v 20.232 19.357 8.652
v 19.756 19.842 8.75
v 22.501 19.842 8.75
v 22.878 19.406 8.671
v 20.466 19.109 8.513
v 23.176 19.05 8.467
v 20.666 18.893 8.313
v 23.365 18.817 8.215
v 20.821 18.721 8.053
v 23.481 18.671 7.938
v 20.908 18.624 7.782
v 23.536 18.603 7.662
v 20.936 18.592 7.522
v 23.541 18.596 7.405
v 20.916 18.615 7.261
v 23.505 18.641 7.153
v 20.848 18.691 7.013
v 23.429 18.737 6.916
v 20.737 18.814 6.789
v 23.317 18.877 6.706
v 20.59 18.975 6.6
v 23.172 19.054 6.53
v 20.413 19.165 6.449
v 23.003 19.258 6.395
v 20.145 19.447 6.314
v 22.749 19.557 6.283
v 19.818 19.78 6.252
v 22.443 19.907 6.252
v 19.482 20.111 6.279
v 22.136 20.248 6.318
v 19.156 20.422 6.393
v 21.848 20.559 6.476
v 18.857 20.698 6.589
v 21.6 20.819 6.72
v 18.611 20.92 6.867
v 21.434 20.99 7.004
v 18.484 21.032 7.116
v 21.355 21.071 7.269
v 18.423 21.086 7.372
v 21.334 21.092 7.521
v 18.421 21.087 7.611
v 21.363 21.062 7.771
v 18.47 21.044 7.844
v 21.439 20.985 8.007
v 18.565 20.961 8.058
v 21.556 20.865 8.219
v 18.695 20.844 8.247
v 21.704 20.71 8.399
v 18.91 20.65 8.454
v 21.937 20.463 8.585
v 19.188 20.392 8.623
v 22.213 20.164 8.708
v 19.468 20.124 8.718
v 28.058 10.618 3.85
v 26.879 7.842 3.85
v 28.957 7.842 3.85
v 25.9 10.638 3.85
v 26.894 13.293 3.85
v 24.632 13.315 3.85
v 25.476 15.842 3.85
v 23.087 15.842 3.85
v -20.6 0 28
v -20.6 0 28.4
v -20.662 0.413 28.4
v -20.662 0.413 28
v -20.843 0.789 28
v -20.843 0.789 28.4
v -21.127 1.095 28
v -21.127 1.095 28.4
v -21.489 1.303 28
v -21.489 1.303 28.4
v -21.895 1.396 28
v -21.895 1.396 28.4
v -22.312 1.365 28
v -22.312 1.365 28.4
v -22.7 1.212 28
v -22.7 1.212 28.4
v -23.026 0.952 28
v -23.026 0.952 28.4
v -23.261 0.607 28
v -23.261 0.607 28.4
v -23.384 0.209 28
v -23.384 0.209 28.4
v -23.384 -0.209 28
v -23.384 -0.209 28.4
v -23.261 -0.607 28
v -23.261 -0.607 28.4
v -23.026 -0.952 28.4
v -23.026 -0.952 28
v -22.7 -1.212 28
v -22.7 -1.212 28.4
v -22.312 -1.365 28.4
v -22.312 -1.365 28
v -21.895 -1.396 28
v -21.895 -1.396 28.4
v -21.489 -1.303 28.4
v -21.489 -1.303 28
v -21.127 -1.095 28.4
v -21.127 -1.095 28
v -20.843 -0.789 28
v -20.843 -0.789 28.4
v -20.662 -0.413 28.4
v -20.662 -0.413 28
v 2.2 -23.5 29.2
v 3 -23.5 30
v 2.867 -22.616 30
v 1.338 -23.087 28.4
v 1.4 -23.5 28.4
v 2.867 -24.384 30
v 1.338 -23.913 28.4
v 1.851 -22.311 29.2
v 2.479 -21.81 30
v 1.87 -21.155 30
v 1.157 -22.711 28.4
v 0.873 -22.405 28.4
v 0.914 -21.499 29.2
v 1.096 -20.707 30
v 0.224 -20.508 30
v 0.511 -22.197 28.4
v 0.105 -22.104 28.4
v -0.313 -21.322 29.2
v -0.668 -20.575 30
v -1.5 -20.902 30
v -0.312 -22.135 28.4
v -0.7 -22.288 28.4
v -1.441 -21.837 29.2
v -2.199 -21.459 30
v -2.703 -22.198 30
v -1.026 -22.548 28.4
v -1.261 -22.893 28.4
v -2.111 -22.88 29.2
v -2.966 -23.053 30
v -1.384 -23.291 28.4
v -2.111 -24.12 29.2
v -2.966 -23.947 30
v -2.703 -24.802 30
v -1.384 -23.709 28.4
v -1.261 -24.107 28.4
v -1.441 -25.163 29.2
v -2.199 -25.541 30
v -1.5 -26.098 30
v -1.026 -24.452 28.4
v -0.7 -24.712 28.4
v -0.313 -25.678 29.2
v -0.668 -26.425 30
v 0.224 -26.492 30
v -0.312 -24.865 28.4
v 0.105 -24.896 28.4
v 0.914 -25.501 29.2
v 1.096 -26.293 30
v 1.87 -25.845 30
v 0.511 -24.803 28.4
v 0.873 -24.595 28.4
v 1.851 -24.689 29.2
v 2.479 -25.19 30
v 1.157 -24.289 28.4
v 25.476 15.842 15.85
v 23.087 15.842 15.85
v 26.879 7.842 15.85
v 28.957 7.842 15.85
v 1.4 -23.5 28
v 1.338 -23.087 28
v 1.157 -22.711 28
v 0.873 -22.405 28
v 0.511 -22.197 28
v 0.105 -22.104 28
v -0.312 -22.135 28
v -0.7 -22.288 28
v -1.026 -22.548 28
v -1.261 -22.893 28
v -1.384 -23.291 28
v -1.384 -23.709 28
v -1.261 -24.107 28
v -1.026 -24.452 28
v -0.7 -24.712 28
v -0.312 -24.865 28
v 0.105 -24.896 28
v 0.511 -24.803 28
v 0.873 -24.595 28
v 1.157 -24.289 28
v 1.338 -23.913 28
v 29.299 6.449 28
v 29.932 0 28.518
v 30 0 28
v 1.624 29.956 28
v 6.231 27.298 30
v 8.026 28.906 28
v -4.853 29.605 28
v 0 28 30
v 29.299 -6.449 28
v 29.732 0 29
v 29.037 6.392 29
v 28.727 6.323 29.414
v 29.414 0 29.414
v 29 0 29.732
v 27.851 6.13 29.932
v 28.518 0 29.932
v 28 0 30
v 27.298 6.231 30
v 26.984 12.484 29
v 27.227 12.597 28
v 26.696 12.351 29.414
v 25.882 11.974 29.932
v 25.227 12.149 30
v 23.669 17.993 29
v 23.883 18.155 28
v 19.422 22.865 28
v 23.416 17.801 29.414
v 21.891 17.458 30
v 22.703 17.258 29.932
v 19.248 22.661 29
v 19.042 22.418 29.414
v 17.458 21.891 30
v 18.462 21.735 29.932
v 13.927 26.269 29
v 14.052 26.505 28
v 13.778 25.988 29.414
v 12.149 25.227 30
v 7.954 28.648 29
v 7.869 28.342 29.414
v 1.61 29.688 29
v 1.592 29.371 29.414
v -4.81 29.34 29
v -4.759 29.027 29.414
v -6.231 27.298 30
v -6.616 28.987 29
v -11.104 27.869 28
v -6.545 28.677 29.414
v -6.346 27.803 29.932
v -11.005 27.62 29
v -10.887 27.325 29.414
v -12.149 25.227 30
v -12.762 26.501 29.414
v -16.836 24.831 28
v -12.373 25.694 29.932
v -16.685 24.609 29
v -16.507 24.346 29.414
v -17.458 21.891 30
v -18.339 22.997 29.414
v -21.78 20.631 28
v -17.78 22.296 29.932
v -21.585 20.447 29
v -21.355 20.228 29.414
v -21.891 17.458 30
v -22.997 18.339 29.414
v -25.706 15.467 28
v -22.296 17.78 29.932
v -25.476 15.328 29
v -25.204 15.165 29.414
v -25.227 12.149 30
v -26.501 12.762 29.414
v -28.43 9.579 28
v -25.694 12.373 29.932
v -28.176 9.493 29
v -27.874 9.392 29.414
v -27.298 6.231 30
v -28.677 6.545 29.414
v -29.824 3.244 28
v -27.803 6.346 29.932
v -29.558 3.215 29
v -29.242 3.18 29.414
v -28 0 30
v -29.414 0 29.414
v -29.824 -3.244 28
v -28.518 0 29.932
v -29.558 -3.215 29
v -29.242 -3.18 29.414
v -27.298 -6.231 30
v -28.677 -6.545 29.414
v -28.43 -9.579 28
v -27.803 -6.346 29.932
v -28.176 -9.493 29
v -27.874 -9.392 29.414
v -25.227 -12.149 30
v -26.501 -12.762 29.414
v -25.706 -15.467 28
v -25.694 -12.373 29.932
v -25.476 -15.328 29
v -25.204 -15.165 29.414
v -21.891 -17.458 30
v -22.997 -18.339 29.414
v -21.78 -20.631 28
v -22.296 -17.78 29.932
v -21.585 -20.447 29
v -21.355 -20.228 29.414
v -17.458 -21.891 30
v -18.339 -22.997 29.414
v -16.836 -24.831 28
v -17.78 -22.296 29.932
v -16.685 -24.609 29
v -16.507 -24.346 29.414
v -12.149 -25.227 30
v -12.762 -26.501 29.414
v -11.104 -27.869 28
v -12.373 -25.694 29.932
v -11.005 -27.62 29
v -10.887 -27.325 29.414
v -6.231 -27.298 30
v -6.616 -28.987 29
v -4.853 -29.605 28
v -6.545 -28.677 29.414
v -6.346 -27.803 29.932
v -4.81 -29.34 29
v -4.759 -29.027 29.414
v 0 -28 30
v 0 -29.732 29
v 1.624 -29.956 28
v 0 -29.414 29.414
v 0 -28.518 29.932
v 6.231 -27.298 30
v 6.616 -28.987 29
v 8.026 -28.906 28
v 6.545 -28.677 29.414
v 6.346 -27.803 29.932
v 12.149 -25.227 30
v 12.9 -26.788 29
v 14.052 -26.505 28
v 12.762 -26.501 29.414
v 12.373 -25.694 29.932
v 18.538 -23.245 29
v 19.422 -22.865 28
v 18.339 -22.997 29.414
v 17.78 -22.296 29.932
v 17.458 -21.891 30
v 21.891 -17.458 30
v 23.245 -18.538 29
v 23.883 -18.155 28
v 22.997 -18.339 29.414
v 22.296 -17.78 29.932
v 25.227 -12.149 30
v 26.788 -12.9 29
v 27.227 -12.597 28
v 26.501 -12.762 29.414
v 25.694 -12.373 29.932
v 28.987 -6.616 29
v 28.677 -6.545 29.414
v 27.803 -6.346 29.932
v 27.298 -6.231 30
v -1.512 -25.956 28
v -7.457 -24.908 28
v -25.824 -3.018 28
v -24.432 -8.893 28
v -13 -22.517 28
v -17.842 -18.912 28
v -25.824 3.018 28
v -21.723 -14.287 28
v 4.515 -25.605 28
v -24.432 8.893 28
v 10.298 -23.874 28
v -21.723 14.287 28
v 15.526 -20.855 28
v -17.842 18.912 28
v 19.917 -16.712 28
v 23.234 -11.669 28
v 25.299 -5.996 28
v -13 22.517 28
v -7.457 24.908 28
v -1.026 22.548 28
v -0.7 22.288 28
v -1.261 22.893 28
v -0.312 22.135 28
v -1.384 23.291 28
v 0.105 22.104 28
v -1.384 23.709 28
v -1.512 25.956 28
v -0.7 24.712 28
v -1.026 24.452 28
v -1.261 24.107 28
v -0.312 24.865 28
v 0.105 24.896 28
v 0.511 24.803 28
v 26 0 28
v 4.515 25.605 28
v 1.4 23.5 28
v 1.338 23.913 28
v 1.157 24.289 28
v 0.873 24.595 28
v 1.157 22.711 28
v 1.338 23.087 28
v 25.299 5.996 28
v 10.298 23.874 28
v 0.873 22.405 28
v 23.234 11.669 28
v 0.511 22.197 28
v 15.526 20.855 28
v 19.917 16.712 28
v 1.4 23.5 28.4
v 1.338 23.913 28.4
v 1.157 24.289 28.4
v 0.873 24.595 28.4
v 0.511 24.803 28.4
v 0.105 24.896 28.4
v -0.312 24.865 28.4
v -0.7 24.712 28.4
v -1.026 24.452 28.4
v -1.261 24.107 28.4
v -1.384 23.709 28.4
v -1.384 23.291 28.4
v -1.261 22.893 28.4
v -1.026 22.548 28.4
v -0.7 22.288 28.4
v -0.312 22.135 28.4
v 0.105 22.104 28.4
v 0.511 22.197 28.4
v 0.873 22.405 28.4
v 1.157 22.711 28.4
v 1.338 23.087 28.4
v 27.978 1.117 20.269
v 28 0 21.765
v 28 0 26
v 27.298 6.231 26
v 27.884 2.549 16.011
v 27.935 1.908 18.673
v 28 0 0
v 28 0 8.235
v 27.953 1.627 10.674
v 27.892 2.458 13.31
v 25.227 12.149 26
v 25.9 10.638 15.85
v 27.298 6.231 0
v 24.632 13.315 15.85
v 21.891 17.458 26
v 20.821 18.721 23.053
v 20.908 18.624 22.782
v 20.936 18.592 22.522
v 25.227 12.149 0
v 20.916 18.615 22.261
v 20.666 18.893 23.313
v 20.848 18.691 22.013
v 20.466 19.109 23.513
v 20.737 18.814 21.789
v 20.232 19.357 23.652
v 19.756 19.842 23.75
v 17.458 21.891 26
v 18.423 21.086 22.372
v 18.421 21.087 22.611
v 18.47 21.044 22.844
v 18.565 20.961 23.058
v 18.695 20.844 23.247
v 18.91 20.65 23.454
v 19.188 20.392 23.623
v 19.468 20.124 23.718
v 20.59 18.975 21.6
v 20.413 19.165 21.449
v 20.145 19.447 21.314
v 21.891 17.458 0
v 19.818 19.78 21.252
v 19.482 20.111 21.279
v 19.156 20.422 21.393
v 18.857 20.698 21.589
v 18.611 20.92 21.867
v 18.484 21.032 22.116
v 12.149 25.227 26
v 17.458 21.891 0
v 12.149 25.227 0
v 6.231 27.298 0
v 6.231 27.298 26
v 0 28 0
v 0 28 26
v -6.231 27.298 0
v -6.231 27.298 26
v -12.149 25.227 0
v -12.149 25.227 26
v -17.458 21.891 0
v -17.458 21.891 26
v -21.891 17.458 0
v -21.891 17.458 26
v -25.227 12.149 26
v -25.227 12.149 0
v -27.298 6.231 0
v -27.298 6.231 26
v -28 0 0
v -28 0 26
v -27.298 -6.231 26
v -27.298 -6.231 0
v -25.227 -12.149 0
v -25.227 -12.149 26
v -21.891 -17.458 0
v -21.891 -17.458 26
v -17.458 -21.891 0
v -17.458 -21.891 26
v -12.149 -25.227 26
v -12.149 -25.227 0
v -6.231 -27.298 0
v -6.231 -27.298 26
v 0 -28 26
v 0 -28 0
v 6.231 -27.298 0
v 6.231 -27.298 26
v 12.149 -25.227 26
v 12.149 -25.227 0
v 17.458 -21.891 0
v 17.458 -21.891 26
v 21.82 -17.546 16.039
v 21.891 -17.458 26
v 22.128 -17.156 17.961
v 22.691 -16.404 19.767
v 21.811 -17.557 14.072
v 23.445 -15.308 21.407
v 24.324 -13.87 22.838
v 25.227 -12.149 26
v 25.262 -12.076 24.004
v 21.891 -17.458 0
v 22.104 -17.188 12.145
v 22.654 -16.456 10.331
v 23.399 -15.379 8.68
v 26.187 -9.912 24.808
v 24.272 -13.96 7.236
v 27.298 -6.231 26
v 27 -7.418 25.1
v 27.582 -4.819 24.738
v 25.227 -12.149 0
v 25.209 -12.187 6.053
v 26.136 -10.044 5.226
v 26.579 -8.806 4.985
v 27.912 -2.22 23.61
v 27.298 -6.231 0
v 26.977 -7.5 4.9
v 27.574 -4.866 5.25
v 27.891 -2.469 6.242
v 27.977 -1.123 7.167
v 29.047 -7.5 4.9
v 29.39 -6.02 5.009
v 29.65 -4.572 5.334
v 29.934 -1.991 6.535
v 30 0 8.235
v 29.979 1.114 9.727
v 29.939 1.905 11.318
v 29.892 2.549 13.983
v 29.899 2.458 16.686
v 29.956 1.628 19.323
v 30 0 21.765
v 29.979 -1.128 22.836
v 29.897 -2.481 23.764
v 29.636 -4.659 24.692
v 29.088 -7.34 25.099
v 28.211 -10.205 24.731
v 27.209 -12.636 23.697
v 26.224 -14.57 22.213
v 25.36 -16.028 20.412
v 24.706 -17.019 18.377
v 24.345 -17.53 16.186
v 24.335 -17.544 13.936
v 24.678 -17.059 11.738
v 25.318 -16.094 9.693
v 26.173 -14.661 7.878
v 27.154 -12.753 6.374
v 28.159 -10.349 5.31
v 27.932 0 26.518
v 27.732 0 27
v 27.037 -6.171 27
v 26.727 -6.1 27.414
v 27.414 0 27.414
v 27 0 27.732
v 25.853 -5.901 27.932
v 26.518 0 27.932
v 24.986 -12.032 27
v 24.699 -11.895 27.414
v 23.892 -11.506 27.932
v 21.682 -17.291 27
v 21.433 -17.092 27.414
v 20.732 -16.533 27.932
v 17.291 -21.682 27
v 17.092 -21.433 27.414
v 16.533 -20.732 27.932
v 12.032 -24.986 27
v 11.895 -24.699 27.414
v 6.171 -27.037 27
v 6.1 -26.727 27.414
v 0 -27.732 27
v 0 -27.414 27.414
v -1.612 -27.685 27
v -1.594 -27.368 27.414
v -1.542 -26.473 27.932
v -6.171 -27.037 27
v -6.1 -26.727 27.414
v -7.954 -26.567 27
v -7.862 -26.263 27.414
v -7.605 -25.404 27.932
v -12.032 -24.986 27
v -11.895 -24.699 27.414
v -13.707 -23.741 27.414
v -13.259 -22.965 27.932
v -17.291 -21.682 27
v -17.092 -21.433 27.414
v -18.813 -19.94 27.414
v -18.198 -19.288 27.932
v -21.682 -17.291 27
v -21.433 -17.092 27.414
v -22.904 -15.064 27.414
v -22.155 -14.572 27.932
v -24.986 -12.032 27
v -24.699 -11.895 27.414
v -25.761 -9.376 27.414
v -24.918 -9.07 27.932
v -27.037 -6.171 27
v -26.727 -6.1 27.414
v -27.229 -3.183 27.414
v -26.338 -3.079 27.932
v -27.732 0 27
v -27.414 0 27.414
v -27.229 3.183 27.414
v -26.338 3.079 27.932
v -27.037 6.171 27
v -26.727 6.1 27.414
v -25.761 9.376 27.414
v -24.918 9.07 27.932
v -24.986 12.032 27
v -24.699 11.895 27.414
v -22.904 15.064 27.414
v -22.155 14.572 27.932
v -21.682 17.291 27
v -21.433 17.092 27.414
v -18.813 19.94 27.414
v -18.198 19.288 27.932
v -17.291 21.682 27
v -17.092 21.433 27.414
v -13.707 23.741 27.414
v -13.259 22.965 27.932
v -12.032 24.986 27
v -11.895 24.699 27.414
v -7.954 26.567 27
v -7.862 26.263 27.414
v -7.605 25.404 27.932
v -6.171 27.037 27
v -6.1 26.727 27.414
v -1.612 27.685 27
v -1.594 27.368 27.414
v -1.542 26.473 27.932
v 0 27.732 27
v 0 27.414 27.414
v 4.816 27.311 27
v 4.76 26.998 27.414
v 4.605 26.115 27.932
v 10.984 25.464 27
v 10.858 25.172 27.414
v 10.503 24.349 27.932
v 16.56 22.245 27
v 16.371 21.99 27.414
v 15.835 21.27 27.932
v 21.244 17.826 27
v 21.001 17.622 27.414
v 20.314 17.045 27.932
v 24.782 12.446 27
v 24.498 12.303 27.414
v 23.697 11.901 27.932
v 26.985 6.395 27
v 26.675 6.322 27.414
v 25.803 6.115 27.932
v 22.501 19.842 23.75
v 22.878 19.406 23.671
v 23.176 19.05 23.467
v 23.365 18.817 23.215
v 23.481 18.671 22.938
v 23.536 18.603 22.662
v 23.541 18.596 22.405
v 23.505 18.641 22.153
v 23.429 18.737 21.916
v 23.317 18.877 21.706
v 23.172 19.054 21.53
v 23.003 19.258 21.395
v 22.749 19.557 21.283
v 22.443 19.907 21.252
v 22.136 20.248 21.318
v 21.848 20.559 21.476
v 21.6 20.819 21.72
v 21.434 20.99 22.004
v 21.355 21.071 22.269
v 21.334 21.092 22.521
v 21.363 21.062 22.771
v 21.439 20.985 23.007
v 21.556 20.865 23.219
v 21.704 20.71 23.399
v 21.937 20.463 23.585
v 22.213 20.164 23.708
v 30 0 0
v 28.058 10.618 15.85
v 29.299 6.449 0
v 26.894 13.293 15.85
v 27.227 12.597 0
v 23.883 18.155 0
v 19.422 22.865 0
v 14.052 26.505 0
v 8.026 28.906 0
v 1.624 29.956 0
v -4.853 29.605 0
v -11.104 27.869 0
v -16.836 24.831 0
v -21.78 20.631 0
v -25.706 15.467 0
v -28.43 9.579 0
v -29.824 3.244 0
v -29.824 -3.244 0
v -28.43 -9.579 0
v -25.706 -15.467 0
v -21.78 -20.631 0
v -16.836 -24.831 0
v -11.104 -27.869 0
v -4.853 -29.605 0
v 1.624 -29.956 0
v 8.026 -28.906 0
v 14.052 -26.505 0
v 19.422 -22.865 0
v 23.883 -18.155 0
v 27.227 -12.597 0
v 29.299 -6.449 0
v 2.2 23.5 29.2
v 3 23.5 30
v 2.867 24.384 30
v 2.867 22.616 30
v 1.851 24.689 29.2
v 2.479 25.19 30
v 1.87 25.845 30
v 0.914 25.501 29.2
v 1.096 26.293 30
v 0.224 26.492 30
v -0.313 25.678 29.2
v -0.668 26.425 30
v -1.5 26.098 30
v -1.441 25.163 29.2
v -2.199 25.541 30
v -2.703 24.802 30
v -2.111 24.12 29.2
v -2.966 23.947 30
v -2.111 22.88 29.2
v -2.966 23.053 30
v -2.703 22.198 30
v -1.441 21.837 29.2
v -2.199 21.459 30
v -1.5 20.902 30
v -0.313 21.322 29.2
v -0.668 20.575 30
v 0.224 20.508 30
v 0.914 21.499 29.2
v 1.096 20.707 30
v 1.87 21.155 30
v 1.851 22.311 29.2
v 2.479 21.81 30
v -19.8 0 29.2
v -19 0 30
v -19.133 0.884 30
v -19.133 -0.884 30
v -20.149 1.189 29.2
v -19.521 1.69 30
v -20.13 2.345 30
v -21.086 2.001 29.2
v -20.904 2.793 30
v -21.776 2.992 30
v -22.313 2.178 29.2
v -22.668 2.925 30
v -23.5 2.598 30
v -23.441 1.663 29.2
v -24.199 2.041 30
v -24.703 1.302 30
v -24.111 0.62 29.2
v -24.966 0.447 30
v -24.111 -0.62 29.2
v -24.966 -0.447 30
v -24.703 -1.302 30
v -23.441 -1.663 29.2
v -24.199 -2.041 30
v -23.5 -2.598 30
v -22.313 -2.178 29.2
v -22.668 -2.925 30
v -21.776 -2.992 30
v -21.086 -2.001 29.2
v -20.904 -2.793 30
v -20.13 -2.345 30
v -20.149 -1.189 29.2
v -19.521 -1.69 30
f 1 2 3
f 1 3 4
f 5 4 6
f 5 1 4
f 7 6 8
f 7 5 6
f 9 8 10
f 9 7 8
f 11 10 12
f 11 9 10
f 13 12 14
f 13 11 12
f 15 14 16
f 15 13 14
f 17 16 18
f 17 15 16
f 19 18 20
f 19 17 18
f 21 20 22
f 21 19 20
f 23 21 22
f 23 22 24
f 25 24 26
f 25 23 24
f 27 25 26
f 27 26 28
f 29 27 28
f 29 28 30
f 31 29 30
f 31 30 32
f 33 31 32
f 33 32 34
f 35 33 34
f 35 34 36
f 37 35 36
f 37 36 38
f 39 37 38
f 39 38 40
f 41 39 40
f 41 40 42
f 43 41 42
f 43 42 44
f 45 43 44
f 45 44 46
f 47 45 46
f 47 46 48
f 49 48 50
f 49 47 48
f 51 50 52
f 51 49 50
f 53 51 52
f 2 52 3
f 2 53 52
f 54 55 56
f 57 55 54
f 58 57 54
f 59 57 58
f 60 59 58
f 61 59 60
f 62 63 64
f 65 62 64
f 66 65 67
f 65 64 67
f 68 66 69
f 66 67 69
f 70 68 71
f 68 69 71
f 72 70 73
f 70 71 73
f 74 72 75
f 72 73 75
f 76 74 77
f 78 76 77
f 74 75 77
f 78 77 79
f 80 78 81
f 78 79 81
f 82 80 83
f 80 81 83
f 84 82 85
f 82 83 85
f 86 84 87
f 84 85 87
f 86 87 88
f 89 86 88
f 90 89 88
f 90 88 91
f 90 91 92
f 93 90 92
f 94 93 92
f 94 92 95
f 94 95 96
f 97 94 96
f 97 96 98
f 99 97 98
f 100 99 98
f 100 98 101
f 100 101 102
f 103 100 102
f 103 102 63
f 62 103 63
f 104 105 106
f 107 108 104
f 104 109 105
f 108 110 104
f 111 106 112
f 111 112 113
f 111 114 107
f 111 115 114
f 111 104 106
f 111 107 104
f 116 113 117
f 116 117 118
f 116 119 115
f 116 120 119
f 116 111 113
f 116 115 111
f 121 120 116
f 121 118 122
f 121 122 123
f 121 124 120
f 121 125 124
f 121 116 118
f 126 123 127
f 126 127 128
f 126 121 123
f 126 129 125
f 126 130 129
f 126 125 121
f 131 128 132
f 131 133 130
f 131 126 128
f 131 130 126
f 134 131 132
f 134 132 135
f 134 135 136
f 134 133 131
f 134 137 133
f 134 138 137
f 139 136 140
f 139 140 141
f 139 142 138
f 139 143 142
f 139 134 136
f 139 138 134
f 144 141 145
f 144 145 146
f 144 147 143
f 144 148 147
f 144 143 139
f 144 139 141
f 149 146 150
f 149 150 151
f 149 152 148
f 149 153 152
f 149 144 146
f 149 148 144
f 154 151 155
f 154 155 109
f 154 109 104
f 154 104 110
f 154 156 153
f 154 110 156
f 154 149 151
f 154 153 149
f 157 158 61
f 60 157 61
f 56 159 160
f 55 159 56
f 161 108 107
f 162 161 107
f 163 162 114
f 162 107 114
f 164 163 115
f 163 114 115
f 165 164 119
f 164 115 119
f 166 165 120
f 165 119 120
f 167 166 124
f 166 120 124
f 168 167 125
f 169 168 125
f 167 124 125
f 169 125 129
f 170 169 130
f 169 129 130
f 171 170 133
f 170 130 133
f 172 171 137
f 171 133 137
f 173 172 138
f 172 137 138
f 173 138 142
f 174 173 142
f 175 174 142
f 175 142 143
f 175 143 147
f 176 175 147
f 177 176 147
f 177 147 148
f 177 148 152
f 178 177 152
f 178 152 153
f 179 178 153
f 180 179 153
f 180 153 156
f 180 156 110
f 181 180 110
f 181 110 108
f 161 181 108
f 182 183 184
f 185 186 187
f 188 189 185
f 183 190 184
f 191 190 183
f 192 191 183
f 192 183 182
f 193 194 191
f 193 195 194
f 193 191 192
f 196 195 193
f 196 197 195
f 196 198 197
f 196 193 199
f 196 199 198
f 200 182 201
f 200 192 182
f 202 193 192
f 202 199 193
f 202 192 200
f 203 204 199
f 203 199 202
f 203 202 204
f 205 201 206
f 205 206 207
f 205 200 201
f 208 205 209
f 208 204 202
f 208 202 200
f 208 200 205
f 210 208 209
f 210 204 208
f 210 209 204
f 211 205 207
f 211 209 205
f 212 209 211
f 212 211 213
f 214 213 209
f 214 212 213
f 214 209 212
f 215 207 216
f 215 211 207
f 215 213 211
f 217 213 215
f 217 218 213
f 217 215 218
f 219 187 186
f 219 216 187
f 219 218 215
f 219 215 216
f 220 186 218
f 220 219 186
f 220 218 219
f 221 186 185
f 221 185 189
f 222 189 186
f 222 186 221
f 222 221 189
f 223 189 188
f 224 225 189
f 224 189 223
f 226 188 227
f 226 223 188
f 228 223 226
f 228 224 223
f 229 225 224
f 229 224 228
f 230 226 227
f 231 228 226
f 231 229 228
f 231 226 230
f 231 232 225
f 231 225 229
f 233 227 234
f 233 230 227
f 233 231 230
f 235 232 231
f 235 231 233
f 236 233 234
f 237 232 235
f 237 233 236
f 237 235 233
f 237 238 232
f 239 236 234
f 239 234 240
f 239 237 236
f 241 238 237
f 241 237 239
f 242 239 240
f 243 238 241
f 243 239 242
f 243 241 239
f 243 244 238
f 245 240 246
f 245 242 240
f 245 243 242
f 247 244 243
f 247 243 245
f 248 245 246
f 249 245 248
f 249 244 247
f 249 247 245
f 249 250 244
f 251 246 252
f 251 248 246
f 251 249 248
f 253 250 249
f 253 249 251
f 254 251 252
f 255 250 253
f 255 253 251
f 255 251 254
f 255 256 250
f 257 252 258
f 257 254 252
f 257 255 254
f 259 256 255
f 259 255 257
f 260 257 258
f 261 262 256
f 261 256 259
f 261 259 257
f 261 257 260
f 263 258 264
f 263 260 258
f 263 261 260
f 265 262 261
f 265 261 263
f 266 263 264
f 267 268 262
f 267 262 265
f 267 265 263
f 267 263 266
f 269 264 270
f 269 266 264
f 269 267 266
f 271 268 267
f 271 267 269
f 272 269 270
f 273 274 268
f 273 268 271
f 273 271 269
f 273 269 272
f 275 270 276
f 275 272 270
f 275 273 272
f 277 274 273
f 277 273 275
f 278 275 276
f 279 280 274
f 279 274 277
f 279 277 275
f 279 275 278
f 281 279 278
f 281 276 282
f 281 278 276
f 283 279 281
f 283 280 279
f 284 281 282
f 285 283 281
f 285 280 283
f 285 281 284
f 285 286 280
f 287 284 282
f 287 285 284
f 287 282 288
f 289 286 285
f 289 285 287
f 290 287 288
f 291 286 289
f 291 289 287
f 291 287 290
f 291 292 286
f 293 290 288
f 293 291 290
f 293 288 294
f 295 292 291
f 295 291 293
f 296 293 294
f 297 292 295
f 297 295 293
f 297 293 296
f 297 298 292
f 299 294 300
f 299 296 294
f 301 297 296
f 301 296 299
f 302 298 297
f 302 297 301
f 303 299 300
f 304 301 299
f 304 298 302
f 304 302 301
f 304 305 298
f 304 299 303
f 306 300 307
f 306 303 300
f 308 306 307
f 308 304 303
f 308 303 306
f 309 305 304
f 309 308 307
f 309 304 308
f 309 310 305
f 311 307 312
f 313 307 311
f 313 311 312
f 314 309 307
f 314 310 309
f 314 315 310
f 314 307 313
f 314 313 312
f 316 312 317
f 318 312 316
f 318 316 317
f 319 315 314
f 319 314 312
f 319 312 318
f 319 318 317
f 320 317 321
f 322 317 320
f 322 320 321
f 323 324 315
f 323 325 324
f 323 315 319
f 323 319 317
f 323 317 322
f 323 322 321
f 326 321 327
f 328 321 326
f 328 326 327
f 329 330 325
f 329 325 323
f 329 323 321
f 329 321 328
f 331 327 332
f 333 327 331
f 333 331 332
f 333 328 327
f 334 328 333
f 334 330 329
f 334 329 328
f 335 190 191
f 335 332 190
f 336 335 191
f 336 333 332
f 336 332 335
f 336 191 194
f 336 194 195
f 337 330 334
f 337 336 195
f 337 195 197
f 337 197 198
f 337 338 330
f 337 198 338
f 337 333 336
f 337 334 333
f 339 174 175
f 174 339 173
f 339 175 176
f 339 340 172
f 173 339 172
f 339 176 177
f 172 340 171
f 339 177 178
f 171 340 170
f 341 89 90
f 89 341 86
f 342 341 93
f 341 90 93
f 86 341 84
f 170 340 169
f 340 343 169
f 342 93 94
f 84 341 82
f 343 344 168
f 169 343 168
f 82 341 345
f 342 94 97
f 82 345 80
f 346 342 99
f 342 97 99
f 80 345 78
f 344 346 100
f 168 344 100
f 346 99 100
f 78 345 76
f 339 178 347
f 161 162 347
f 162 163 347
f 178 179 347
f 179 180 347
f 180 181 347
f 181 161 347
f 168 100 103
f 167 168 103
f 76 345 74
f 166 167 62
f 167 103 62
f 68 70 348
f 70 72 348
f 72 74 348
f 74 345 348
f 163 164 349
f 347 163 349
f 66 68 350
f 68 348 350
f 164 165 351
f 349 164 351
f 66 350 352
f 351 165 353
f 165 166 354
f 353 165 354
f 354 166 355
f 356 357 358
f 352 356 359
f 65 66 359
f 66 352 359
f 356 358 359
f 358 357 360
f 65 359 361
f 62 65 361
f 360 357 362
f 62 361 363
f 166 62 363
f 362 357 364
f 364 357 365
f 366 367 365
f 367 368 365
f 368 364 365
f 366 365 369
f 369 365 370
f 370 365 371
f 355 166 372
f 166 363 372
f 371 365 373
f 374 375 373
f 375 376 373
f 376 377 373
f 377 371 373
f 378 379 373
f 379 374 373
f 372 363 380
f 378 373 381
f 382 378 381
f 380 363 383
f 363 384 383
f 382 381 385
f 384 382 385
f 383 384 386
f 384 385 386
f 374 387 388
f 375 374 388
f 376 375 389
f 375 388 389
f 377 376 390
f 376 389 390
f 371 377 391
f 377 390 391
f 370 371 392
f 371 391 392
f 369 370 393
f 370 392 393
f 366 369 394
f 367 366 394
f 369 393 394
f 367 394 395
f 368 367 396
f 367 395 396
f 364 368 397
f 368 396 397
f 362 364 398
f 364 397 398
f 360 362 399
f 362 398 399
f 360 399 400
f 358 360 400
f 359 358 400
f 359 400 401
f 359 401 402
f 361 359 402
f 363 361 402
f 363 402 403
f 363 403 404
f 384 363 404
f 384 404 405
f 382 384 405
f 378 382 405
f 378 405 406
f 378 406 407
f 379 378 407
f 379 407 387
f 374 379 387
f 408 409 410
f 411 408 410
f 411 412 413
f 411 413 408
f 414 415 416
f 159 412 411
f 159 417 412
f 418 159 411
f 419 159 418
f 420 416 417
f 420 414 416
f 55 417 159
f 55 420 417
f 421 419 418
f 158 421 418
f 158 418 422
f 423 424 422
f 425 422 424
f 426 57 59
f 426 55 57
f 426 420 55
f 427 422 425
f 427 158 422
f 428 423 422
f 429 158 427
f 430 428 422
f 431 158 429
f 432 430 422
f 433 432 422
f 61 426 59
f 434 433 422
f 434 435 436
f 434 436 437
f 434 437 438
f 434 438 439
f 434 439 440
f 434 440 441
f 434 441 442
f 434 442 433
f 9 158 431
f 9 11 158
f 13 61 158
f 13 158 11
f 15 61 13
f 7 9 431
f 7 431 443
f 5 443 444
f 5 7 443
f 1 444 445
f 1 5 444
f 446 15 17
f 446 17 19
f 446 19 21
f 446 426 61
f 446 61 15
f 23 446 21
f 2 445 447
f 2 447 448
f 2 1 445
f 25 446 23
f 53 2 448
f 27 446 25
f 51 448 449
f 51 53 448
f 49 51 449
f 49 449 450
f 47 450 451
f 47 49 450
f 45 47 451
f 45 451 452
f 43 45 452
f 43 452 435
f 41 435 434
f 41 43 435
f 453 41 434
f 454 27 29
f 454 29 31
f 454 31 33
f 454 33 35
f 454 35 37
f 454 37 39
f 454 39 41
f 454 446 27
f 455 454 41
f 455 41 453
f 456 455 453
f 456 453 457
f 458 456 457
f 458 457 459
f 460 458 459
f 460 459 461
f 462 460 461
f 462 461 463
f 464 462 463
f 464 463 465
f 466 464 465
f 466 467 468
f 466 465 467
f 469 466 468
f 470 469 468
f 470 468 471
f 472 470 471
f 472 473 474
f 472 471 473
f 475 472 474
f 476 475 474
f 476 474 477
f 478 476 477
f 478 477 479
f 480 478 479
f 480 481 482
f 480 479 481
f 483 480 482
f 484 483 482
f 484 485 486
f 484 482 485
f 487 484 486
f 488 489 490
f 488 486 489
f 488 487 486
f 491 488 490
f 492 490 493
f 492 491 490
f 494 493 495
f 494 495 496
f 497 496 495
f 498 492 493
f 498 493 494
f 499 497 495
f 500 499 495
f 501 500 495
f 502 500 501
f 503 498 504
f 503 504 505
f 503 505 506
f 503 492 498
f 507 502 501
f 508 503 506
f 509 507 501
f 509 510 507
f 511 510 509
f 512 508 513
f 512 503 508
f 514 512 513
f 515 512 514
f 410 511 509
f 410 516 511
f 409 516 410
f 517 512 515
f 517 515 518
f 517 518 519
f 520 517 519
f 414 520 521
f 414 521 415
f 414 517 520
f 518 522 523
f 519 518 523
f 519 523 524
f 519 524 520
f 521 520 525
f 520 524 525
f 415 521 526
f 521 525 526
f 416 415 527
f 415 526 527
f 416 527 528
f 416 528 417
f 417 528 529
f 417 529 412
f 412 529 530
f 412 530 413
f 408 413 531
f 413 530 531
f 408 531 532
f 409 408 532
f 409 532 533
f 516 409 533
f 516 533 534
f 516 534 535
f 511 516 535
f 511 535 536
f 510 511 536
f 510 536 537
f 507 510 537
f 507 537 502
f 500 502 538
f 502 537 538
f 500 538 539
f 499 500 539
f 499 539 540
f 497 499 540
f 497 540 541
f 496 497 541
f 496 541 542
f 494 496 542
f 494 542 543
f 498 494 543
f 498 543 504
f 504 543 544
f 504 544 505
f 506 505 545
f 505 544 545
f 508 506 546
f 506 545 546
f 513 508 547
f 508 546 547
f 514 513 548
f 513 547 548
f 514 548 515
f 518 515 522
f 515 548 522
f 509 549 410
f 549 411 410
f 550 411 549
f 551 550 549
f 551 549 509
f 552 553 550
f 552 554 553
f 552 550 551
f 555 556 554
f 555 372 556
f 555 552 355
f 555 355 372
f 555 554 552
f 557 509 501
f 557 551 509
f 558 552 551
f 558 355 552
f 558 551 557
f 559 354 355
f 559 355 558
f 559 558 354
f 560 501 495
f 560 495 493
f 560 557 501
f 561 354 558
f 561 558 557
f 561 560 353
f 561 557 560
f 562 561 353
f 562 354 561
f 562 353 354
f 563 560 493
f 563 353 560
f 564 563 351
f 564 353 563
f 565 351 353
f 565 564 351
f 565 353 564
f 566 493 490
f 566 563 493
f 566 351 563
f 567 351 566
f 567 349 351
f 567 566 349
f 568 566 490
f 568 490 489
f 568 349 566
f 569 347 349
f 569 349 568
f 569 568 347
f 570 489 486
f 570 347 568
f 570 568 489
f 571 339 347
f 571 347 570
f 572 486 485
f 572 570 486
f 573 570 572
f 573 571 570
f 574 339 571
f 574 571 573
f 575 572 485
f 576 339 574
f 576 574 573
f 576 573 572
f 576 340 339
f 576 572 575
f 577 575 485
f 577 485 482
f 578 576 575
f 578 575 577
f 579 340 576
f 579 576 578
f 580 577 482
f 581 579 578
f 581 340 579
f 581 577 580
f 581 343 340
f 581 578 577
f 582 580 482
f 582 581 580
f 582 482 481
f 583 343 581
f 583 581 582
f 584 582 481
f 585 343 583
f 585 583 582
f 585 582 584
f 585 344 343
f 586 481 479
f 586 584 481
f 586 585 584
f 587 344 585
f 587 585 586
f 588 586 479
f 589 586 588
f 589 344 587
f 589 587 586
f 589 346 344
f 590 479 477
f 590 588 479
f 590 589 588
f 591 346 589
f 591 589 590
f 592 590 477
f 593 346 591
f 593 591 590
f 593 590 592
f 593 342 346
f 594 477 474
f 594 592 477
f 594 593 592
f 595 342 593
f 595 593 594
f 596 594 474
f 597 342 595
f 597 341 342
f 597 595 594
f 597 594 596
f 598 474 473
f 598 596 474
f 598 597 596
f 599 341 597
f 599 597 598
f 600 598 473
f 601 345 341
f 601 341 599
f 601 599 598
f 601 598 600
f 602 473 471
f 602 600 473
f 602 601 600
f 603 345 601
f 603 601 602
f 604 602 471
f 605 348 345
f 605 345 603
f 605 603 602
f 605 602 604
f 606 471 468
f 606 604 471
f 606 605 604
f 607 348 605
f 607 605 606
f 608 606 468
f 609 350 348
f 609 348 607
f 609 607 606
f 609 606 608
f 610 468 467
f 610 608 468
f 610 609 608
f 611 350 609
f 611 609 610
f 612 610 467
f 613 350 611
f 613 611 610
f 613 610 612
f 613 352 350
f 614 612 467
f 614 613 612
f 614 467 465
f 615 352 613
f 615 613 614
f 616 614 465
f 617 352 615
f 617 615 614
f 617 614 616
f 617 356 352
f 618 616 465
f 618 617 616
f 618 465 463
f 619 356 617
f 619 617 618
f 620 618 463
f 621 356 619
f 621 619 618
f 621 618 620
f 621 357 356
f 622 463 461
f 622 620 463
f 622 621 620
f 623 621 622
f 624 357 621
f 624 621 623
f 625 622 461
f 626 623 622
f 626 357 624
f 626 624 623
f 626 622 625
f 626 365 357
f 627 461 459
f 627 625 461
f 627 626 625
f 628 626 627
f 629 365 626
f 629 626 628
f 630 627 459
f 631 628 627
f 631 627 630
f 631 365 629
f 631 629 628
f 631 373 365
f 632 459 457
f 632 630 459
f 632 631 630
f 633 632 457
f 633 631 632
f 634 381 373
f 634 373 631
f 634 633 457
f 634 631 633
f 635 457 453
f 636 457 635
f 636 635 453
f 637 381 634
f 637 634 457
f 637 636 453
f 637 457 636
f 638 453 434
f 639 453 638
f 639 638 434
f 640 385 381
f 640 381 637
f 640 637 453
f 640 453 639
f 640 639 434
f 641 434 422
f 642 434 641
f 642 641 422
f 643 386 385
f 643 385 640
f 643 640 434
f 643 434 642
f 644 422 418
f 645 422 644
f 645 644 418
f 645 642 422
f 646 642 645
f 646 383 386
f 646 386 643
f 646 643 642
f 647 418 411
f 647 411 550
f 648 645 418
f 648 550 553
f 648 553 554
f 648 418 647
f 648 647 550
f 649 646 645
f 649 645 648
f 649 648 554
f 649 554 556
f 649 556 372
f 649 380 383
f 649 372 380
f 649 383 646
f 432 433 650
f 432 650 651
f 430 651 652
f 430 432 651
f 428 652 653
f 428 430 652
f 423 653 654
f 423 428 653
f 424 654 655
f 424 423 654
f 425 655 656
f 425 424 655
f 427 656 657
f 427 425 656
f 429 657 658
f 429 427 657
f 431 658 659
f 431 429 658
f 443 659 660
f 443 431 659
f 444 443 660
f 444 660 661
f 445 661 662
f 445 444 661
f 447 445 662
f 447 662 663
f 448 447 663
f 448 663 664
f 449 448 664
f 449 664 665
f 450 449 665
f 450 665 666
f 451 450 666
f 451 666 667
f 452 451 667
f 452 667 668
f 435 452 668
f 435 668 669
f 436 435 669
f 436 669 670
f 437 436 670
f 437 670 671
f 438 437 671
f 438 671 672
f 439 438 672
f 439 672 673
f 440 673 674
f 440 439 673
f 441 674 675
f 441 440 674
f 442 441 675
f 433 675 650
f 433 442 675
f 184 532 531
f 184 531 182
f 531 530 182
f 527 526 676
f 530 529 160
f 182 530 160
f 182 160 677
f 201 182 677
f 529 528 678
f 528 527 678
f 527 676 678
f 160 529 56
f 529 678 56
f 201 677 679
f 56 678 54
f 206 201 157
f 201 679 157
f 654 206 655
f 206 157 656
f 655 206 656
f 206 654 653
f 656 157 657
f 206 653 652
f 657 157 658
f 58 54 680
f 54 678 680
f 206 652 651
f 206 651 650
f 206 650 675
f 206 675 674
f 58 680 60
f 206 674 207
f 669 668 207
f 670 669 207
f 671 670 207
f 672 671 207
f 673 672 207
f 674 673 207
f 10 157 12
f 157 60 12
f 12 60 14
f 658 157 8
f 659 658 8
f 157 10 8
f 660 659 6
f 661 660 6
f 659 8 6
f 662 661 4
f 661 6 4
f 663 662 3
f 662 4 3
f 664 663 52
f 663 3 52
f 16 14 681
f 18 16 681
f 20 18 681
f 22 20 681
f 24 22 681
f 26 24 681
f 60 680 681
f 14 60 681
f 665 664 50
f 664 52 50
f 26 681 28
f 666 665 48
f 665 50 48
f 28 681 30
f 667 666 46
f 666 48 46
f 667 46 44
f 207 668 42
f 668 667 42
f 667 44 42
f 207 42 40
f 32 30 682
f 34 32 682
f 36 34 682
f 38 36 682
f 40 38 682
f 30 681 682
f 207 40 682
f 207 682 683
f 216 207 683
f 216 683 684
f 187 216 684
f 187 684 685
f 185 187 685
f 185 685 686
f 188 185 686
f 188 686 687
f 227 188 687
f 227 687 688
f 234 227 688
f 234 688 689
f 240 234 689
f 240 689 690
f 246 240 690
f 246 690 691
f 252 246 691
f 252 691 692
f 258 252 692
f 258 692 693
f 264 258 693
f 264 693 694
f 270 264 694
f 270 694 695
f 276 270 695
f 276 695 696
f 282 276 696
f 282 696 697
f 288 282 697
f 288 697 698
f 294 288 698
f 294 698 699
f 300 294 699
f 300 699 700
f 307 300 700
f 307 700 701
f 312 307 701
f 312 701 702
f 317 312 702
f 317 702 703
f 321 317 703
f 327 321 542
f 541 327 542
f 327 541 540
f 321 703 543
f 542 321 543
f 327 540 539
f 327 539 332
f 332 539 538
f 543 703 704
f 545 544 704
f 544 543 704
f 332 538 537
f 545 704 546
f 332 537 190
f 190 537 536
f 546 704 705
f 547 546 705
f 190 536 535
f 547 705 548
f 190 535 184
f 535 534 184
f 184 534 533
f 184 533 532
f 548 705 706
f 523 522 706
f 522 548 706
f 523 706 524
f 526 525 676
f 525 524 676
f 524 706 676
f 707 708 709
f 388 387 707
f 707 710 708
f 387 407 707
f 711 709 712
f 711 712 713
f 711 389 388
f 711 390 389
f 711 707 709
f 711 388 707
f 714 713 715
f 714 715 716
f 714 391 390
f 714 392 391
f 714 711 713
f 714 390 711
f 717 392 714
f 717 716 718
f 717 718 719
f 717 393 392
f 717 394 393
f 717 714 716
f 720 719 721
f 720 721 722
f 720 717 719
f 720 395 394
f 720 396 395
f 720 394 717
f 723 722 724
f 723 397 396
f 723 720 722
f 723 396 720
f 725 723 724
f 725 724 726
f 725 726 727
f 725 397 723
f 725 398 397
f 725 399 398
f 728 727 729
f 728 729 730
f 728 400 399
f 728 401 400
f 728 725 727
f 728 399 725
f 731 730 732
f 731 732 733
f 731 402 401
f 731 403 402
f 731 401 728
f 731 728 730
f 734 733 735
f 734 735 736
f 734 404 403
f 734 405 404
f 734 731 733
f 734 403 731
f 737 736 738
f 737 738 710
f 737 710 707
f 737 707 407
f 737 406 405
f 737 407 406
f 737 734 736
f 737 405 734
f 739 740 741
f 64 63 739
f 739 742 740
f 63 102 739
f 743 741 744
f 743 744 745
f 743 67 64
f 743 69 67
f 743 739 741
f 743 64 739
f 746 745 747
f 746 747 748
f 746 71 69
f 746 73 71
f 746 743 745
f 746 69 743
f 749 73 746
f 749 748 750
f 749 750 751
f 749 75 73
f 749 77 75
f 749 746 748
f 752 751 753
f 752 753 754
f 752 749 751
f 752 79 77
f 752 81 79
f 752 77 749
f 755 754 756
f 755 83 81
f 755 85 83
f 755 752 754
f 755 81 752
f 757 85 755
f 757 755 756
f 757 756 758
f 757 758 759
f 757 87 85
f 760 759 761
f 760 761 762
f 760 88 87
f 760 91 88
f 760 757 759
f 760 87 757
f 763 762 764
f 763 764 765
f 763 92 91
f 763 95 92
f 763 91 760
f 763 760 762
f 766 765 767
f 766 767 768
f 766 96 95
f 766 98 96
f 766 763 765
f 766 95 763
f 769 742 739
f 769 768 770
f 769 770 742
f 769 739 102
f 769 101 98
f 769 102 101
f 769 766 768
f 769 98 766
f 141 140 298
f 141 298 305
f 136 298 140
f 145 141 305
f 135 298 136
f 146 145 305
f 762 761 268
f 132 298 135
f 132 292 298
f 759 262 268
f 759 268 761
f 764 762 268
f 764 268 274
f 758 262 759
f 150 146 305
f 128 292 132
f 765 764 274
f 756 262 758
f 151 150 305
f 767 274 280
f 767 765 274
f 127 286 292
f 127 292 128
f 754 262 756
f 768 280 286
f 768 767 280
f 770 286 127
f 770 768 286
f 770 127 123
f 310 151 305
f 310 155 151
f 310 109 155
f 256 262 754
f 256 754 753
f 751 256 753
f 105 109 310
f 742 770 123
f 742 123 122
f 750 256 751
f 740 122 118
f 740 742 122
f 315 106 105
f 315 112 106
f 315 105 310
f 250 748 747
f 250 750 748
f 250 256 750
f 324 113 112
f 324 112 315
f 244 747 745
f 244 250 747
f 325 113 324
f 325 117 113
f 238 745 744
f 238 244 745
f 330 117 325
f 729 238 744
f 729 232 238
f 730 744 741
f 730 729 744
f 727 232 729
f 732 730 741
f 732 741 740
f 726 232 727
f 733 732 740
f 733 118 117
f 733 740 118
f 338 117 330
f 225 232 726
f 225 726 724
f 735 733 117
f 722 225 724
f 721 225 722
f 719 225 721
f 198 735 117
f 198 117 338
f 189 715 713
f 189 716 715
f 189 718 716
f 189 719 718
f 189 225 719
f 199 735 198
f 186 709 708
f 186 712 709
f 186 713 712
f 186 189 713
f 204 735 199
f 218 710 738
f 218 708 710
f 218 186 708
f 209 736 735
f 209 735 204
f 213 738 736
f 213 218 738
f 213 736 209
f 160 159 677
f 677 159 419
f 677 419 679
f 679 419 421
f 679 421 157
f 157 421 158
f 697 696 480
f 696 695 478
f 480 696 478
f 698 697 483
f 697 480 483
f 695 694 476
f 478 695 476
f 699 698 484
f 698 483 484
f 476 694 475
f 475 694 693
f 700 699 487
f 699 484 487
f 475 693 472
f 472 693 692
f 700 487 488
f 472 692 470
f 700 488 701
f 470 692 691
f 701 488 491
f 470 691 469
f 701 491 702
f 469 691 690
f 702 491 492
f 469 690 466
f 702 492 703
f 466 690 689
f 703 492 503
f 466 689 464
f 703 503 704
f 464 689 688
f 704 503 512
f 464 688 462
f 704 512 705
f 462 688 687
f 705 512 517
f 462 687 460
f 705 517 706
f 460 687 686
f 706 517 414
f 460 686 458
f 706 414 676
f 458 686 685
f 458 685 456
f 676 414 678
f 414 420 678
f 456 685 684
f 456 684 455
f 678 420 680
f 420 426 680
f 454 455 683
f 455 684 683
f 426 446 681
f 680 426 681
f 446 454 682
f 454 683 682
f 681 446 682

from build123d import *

# Parameters (mm, degrees)
CROQUIS1_R              = 30
SALIENTE_EXTRUIR1_DEPTH = 30
VACIADO1_T              = -2
REDONDEO1_R             = 2
CORTAR_EXTRUIR1_REACH   = 75.485
CROQUIS3_R              = 10.1
CORTAR_EXTRUIR2_REACH   = 53.962
CROQUIS5_R              = 1.4
CHAFL_N1_SIZE           = 1.6
CROQUIS11_R             = 1.25
CROQUIS11_W             = 12
CROQUIS11_H             = 8
CORTAR_EXTRUIR3_DEPTH   = 52.961524343


with BuildPart() as part:
    # Croquis1 → Saliente-Extruir1 (new body)
    with BuildSketch(Plane.XY):
        Circle(CROQUIS1_R)
    extrude(amount=SALIENTE_EXTRUIR1_DEPTH)

    # Vaciado1
    vaciado1_openings = [part.faces().sort_by_distance(p)[0] for p in [
        (0, 0, 0),
    ]]
    offset(amount=VACIADO1_T, openings=vaciado1_openings, kind=Kind.INTERSECTION)

    # Redondeo1
    redondeo1_edges = [part.edges().sort_by_distance(p)[0] for p in [
        (-30, 0, 30),
        (-28, 0, 28),
    ]]
    fillet(redondeo1_edges, radius=REDONDEO1_R)

    # Croquis3 → Cortar-Extruir1 (cut, up to next)
    with BuildSketch(Plane(origin=(30, 0, 30), x_dir=(0, 0, -1), z_dir=(1, 0, 0)), mode=Mode.PRIVATE) as cortar_extruir1_sk1:
        with Locations((15, -7.5)):
            Circle(CROQUIS3_R)
    cortar_extruir1_tool1 = extrude(cortar_extruir1_sk1.sketch, amount=-CORTAR_EXTRUIR1_REACH, mode=Mode.PRIVATE) & part.part
    add(cortar_extruir1_tool1.solids().sort_by_distance((30, -7.5, 15))[0], mode=Mode.SUBTRACT)

    # Croquis5 → Cortar-Extruir2 (cut, up to next)
    with BuildSketch(Plane.XY.offset(30), mode=Mode.PRIVATE) as cortar_extruir2_sk1:
        with Locations((0, 23.5)):
            Circle(CROQUIS5_R)
    cortar_extruir2_tool1 = extrude(cortar_extruir2_sk1.sketch, amount=-CORTAR_EXTRUIR2_REACH, mode=Mode.PRIVATE) & part.part
    # Croquis5 → Cortar-Extruir2 (cut, up to next)
    with BuildSketch(Plane.XY.offset(30), mode=Mode.PRIVATE) as cortar_extruir2_sk2:
        with Locations((-22, 0)):
            Circle(CROQUIS5_R)
    cortar_extruir2_tool2 = extrude(cortar_extruir2_sk2.sketch, amount=-CORTAR_EXTRUIR2_REACH, mode=Mode.PRIVATE) & part.part
    # Croquis5 → Cortar-Extruir2 (cut, up to next)
    with BuildSketch(Plane.XY.offset(30), mode=Mode.PRIVATE) as cortar_extruir2_sk3:
        with Locations((0, -23.5)):
            Circle(CROQUIS5_R)
    cortar_extruir2_tool3 = extrude(cortar_extruir2_sk3.sketch, amount=-CORTAR_EXTRUIR2_REACH, mode=Mode.PRIVATE) & part.part
    add(cortar_extruir2_tool1.solids().sort_by_distance((0, 23.5, 30))[0], mode=Mode.SUBTRACT)
    add(cortar_extruir2_tool2.solids().sort_by_distance((-22, 0, 30))[0], mode=Mode.SUBTRACT)
    add(cortar_extruir2_tool3.solids().sort_by_distance((0, -23.5, 30))[0], mode=Mode.SUBTRACT)

    # Chaflán1
    chafl_n1_edges = [part.edges().sort_by_distance(p)[0] for p in [
        (-1.4, 23.5, 30),
        (-23.4, 0, 30),
        (-1.4, -23.5, 30),
    ]]
    chamfer(chafl_n1_edges, length=CHAFL_N1_SIZE)

    # Croquis11 → Cortar-Extruir3 (cut, through all)
    with BuildSketch(Plane(origin=(0, 0, 0), x_dir=(0, 0, -1), z_dir=(1, 0, 0))):
        with Locations(Location((-22.5, 19.842217067, 0), (0, 0, 180))):
            Circle(CROQUIS11_R)
        with Locations(Location((-7.5, 19.842217067, 0), (0, 0, 180))):
            Circle(CROQUIS11_R)
        with Locations((-9.85, 11.842217067)):
            Rectangle(CROQUIS11_W, CROQUIS11_H)
    extrude(amount=CORTAR_EXTRUIR3_DEPTH, mode=Mode.SUBTRACT)


solid = part.part
